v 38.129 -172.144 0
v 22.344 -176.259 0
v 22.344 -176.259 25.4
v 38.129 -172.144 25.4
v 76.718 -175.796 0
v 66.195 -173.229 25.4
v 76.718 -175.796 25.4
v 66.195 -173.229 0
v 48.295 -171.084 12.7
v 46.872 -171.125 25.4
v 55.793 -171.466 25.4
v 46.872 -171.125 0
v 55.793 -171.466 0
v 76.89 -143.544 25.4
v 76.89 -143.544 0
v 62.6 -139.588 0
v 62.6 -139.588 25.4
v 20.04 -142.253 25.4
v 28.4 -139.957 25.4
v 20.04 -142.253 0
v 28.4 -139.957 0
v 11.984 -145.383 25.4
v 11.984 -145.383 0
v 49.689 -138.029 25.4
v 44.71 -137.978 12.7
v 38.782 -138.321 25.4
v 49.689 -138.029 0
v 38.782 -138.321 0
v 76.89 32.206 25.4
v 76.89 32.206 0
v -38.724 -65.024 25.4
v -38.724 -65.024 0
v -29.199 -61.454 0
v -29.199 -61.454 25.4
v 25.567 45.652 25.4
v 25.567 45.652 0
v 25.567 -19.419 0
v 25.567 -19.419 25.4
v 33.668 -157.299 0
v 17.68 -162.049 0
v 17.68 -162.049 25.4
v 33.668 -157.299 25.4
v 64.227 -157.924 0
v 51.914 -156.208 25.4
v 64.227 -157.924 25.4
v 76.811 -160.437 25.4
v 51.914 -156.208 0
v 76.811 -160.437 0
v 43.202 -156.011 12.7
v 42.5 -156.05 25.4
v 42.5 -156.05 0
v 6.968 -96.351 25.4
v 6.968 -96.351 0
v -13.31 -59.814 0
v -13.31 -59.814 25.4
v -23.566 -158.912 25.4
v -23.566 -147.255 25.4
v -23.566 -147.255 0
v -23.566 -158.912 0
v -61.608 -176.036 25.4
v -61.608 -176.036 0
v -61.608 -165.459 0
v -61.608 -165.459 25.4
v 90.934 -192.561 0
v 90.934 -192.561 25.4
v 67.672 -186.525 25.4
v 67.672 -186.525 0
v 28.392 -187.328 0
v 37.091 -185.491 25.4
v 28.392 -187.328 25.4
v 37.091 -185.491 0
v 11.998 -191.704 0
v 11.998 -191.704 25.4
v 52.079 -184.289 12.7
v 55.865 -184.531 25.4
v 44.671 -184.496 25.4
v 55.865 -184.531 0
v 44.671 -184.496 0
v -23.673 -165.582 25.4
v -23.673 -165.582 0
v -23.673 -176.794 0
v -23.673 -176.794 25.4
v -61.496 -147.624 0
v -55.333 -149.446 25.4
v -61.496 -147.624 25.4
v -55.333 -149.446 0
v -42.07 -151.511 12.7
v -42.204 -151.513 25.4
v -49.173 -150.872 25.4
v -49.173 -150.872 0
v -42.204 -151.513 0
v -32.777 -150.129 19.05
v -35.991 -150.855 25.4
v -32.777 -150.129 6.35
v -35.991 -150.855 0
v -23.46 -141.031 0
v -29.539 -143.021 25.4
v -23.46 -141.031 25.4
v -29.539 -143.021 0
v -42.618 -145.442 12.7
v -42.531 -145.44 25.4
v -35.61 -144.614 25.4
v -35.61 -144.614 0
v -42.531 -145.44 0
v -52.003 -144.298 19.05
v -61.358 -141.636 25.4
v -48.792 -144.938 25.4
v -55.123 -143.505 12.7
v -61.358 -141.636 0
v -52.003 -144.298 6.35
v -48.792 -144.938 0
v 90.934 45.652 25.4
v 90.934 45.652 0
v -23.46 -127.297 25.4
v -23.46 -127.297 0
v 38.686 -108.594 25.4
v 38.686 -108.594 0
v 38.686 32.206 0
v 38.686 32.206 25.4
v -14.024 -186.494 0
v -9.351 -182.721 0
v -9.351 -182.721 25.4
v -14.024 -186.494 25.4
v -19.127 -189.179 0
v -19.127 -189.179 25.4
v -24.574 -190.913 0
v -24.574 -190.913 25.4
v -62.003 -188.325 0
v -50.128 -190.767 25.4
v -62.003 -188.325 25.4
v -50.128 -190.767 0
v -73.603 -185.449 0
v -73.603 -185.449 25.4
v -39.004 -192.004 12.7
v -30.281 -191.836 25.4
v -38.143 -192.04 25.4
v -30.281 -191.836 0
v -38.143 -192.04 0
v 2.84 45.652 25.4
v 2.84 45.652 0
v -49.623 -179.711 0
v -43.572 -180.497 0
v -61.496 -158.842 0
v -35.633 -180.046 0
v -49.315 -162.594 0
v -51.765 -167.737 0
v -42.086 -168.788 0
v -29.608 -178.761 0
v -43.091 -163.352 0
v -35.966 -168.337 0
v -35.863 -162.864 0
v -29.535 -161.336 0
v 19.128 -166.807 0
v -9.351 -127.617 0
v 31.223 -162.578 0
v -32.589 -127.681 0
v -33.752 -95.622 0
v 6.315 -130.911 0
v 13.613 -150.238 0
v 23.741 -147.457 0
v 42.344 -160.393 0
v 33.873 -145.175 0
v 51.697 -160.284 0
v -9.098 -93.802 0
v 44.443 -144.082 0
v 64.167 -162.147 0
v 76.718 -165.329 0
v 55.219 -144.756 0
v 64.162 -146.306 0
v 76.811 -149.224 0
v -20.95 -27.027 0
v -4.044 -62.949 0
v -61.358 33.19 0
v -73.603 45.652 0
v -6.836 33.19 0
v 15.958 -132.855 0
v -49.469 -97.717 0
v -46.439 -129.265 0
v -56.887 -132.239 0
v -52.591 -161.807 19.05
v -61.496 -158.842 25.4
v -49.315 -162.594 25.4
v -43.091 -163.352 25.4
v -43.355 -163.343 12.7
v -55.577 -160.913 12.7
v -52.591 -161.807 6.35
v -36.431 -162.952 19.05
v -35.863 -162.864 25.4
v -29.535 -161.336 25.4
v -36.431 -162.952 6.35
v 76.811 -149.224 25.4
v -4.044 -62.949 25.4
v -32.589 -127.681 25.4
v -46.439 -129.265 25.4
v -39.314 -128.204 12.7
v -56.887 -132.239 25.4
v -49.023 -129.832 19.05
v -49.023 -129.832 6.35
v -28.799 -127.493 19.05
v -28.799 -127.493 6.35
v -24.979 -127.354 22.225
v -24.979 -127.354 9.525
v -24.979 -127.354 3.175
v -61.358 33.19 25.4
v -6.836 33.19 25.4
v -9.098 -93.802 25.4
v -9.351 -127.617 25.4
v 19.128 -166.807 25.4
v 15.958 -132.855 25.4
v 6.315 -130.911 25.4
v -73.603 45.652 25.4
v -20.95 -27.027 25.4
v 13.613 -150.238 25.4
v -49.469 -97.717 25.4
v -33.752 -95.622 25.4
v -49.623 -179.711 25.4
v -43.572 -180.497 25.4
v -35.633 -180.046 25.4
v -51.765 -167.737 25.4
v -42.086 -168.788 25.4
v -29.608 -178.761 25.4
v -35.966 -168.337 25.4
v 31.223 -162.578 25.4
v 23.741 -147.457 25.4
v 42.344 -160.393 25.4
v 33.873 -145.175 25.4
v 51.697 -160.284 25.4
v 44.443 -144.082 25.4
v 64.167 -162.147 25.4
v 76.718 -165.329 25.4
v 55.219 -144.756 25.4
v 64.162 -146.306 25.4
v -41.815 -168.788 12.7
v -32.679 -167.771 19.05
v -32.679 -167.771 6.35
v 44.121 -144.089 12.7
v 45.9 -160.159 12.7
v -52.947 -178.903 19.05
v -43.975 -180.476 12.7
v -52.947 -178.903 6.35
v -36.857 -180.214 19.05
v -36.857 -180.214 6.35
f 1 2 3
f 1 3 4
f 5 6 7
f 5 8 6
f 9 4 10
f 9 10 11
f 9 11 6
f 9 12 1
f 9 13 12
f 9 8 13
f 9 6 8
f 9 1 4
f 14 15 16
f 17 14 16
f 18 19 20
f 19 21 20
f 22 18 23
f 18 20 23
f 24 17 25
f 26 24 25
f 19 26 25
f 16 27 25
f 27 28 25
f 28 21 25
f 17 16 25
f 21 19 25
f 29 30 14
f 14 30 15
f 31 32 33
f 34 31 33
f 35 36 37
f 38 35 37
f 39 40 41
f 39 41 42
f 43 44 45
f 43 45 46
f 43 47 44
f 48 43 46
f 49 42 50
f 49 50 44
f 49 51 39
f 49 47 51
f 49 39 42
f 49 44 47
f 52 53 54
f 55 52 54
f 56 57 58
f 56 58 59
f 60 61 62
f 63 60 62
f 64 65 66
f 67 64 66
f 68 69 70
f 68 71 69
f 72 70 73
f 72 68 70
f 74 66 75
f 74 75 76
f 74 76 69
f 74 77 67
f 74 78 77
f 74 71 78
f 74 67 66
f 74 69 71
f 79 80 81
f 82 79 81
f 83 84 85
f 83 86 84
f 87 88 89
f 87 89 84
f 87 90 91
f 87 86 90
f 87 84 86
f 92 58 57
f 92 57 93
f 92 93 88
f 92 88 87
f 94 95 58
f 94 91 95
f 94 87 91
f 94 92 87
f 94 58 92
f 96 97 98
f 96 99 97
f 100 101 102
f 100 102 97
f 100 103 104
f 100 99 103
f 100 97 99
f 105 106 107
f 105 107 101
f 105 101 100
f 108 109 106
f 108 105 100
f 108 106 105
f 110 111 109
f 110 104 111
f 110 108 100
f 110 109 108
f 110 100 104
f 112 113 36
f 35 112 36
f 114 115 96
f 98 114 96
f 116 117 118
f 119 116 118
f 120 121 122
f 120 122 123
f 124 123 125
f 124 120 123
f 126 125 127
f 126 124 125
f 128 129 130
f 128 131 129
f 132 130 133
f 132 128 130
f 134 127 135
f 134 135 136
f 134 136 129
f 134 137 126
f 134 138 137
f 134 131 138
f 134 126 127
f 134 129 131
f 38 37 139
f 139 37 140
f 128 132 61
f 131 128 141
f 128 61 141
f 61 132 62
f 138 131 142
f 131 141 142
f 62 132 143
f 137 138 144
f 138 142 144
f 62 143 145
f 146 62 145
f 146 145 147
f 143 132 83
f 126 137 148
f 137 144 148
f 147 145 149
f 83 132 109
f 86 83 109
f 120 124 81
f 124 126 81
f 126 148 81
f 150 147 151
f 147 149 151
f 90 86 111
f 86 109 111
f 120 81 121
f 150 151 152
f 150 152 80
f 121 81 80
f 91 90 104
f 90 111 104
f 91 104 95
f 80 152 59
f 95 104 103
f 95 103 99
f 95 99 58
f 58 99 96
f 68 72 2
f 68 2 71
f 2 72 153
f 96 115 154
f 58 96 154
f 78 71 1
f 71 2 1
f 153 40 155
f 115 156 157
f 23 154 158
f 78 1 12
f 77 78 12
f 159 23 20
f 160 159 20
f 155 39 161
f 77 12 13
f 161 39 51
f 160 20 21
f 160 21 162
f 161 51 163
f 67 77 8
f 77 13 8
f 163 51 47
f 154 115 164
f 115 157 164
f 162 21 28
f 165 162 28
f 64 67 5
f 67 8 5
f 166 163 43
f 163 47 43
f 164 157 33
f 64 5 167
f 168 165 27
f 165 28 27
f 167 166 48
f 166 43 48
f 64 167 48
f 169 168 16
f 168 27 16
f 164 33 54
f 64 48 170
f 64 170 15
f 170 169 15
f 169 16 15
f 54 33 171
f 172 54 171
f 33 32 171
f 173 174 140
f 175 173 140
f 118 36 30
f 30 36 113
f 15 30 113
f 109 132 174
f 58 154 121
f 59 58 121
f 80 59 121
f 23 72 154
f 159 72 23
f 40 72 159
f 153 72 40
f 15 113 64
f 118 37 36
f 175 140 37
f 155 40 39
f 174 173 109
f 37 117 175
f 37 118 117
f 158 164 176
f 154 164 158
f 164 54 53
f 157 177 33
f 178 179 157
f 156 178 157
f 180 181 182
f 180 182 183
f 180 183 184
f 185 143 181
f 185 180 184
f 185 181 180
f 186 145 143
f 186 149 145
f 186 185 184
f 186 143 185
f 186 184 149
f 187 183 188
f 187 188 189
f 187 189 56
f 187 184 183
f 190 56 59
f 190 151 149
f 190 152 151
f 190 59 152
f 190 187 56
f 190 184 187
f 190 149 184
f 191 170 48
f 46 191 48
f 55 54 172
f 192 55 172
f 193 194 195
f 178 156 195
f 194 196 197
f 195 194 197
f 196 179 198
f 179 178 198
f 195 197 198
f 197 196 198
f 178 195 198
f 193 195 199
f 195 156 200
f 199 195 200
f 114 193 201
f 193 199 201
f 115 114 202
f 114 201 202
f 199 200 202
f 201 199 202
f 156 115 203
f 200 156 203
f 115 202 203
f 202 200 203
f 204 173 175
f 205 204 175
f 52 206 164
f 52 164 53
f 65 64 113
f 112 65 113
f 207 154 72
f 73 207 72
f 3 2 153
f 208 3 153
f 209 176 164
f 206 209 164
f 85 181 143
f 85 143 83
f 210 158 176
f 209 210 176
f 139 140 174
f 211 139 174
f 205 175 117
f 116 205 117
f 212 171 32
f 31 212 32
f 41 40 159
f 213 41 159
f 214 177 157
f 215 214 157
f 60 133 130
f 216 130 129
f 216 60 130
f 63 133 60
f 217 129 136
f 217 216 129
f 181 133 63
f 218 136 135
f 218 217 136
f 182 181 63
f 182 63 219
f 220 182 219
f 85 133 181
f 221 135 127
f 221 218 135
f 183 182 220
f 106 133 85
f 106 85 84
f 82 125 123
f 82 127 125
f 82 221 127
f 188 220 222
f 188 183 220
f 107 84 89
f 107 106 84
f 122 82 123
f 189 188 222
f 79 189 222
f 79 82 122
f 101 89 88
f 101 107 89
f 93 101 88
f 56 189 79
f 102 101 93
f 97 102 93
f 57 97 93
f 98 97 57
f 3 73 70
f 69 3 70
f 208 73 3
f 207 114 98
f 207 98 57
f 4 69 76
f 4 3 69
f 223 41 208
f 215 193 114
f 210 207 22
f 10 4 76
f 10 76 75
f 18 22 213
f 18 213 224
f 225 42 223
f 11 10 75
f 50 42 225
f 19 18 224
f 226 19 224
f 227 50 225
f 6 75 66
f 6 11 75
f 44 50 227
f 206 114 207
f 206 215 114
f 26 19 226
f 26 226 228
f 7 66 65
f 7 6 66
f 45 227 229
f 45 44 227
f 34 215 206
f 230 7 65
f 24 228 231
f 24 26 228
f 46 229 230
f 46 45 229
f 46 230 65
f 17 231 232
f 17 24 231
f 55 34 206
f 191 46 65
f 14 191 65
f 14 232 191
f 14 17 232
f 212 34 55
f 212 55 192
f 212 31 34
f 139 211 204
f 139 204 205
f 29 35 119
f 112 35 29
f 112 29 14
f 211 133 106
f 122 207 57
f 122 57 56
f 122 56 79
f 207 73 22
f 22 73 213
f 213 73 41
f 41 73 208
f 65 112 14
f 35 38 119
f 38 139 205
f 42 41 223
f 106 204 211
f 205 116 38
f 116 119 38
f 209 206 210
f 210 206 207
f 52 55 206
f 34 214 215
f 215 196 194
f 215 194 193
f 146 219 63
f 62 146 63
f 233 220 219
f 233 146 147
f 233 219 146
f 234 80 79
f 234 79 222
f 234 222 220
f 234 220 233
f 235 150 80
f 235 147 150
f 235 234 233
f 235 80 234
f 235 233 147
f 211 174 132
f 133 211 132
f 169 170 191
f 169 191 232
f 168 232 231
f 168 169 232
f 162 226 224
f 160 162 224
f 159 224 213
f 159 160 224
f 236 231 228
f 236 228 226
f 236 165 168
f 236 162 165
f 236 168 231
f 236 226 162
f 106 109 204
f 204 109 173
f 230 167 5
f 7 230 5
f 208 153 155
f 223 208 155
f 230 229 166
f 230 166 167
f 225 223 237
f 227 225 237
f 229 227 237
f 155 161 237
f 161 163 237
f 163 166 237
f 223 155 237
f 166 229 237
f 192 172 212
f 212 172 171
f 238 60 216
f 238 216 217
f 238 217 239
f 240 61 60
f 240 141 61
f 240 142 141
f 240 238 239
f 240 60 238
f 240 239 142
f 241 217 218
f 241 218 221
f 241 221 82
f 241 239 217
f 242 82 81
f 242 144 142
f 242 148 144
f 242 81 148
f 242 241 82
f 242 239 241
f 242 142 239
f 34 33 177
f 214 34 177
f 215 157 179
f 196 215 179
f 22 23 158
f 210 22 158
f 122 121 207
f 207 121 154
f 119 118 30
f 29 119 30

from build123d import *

# Parameters (mm, degrees)
F1_DEPTH = 25.4


with BuildPart() as f1:
    # F0 (on Top) → F1 (new body)
    with BuildSketch(Plane.XY):
        with BuildLine():
            Line((2.8403762262, 45.6520467997), (-73.6027508974, 45.6520467997))
            Line((-73.6027508974, 45.6520467997), (-73.6027508974, -185.4493916035))
            add(Edge.make_bspline(
                [(-9.3509247527, -182.7207505703), (-17.437708134, -190.6869860397), (-39.462107573, -194.4763575001), (-62.4702088535, -188.2325261831), (-73.6027508974, -185.4493916035)],
                knots=[0, 0, 0, 0, 0.4843647, 1, 1, 1, 1], degree=3))
            Line((-9.3509247527, -182.7207505703), (-9.3509247527, -127.6174634695))
            Line((-9.3509247527, -127.6174634695), (11.9979763404, -191.7036473751))
            add(Edge.make_bspline(
                [(90.9340977669, -192.5606280565), (78.2585442066, -189.655855298), (51.9474674394, -179.7068423852), (25.4845232477, -188.0636329791), (11.9979763404, -191.7036473751)],
                knots=[0, 0, 0, 0, 0.4967823227, 1, 1, 1, 1], degree=3))
            Line((90.9340977669, -192.5606280565), (90.9340977669, 45.6520467997))
            Line((90.9340977669, 45.6520467997), (25.5670342594, 45.6520467997))
            Line((25.5670342594, 45.6520467997), (25.5670342594, -19.4191858172))
            Line((25.5670342594, -19.4191858172), (2.8403762262, 45.6520467997))
        make_face()
        with BuildLine():
            Line((-61.6082288325, -176.0364919901), (-61.6082288325, -165.4586195946))
            add(Edge.make_bspline(
                [(-23.6730482429, -165.5816286802), (-29.6743388581, -167.1716020854), (-41.866855763, -170.422804665), (-54.9348358498, -167.1372714885), (-61.6082288325, -165.4586195946)],
                knots=[0, 0, 0, 0, 0.4892970389, 1, 1, 1, 1], degree=3))
            Line((-23.6730482429, -165.5816286802), (-23.6730482429, -176.7938733101))
            add(Edge.make_bspline(
                [(-61.6082288325, -176.0364919901), (-55.8519269533, -178.1175226352), (-44.0650777342, -182.250968639), (-30.3064212203, -179.3696731329), (-23.6730482429, -176.7938733101)],
                knots=[0, 0, 0, 0, 0.4842057013, 1, 1, 1, 1], degree=3))
        make_face(mode=Mode.SUBTRACT)
        with BuildLine():
            Line((-61.4957623184, -158.8420271873), (-61.4957623184, -147.6238518953))
            add(Edge.make_bspline(
                [(-23.566477932, -147.2548544407), (-29.712963668, -149.3360042131), (-42.0451974231, -153.5501506553), (-55.0127920336, -149.6146560989), (-61.4957623184, -147.6238518953)],
                knots=[0, 0, 0, 0, 0.494682972, 1, 1, 1, 1], degree=3))
            Line((-23.566477932, -147.2548544407), (-23.566477932, -158.9123904705))
            add(Edge.make_bspline(
                [(-61.4957623184, -158.8420271873), (-55.5822802874, -161.0065351502), (-43.5958322945, -165.2473219714), (-29.5886882908, -161.9094118541), (-23.566477932, -158.9123904705)],
                knots=[0, 0, 0, 0, 0.4898045376, 1, 1, 1, 1], degree=3))
        make_face(mode=Mode.SUBTRACT)
        with BuildLine():
            Line((22.3441086709, -176.2591153383), (19.1280748695, -166.8069213629))
            add(Edge.make_bspline(
                [(19.1280748695, -166.8069213629), (27.9156584293, -163.297533989), (45.8218010204, -157.4179008912), (66.4390050953, -162.4391177875), (76.7182558775, -165.3293818235)],
                knots=[0, 0, 0, 0, 0.4844139256, 1, 1, 1, 1], degree=3))
            Line((76.7182558775, -165.3293818235), (76.7182558775, -175.7957041264))
            add(Edge.make_bspline(
                [(22.3441086709, -176.2591153383), (30.8734351647, -173.63505248), (48.372189716, -168.6907809082), (67.1033187619, -173.3021776491), (76.7182558775, -175.7957041264)],
                knots=[0, 0, 0, 0, 0.4893730261, 1, 1, 1, 1], degree=3))
        make_face(mode=Mode.SUBTRACT)
        with BuildLine():
            add(Edge.make_bspline(
                [(17.680067569, -162.0491892099), (25.8568657938, -159.2836448096), (43.3363572549, -153.246674733), (65.3150252677, -158.0651620078), (76.8111720681, -160.4368239641)],
                knots=[0, 0, 0, 0, 0.4679630835, 1, 1, 1, 1], degree=3))
            Line((17.680067569, -162.0491892099), (13.6130254536, -150.2377683718))
            add(Edge.make_bspline(
                [(76.8111720681, -149.223998189), (65.8089509547, -146.5744464182), (44.0946442795, -141.1555049391), (23.7747255115, -147.4399738598), (13.6130254536, -150.2377683718)],
                knots=[0, 0, 0, 0, 0.5076708413, 1, 1, 1, 1], degree=3))
            Line((76.8111720681, -149.223998189), (76.8111720681, -160.4368239641))
        make_face(mode=Mode.SUBTRACT)
        with BuildLine():
            add(Edge.make_bspline(
                [(-61.3580606878, -141.6363418102), (-55.1243719971, -143.5797285758), (-42.5699592819, -147.4936358513), (-29.8592976922, -143.1950838215), (-23.4599076211, -141.0309076309)],
                knots=[0, 0, 0, 0, 0.4965336756, 1, 1, 1, 1], degree=3))
            Line((-61.3580606878, -141.6363418102), (-61.3580606878, 33.189624548))
            Line((-61.3580606878, 33.189624548), (-6.8358113058, 33.189624548))
            Line((-6.8358113058, 33.189624548), (38.6858433485, -108.5935905576))
            Line((38.6858433485, -108.5935905576), (38.6858433485, 32.2056338191))
            Line((38.6858433485, 32.2056338191), (76.8895372748, 32.2056338191))
            Line((76.8895372748, 32.2056338191), (76.8895372748, -143.5442268848))
            add(Edge.make_bspline(
                [(76.8895372748, -143.5442268848), (66.1581754684, -139.7765427828), (44.92542678, -135.6920583397), (22.2354233265, -140.7641023397), (11.9839739054, -145.3826874495)],
                knots=[0, 0, 0, 0, 0.4966206681, 1, 1, 1, 1], degree=3))
            Line((11.9839739054, -145.3826874495), (6.3145500608, -130.9114247561))
            Line((6.3145500608, -130.9114247561), (15.9579180181, -132.8547745943))
            Line((15.9579180181, -132.8547745943), (-9.0975156054, -93.8023552299))
            Line((-9.0975156054, -93.8023552299), (6.9675748236, -96.3511392474))
            Line((6.9675748236, -96.3511392474), (-13.3098065853, -59.8137304187))
            Line((-13.3098065853, -59.8137304187), (-4.043716006, -62.948577106))
            Line((-4.043716006, -62.948577106), (-20.9504030645, -27.0268172026))
            Line((-20.9504030645, -27.0268172026), (-38.7236736715, -65.0239139795))
            Line((-38.7236736715, -65.0239139795), (-29.1993748397, -61.4539980888))
            Line((-29.1993748397, -61.4539980888), (-49.4690351188, -97.7168679237))
            Line((-49.4690351188, -97.7168679237), (-33.7521508336, -95.6219658256))
            Line((-33.7521508336, -95.6219658256), (-56.8872727454, -132.2386860847))
            add(Edge.make_bspline(
                [(-56.8872727454, -132.2386860847), (-51.9440866881, -130.4241960282), (-41.8102623942, -127.6231875659), (-23.5047530606, -127.3379553592), (-23.4599076211, -127.2974461317)],
                knots=[0, 0, 0, 0, 0.4990520903, 0.9673944803, 0.9673944803, 0.9673944803, 0.9673944803], degree=3))
            Line((-23.4599076211, -127.2974461317), (-23.4599076211, -141.0309076309))
        make_face(mode=Mode.SUBTRACT)
    extrude(amount=F1_DEPTH)


solid = f1.part
